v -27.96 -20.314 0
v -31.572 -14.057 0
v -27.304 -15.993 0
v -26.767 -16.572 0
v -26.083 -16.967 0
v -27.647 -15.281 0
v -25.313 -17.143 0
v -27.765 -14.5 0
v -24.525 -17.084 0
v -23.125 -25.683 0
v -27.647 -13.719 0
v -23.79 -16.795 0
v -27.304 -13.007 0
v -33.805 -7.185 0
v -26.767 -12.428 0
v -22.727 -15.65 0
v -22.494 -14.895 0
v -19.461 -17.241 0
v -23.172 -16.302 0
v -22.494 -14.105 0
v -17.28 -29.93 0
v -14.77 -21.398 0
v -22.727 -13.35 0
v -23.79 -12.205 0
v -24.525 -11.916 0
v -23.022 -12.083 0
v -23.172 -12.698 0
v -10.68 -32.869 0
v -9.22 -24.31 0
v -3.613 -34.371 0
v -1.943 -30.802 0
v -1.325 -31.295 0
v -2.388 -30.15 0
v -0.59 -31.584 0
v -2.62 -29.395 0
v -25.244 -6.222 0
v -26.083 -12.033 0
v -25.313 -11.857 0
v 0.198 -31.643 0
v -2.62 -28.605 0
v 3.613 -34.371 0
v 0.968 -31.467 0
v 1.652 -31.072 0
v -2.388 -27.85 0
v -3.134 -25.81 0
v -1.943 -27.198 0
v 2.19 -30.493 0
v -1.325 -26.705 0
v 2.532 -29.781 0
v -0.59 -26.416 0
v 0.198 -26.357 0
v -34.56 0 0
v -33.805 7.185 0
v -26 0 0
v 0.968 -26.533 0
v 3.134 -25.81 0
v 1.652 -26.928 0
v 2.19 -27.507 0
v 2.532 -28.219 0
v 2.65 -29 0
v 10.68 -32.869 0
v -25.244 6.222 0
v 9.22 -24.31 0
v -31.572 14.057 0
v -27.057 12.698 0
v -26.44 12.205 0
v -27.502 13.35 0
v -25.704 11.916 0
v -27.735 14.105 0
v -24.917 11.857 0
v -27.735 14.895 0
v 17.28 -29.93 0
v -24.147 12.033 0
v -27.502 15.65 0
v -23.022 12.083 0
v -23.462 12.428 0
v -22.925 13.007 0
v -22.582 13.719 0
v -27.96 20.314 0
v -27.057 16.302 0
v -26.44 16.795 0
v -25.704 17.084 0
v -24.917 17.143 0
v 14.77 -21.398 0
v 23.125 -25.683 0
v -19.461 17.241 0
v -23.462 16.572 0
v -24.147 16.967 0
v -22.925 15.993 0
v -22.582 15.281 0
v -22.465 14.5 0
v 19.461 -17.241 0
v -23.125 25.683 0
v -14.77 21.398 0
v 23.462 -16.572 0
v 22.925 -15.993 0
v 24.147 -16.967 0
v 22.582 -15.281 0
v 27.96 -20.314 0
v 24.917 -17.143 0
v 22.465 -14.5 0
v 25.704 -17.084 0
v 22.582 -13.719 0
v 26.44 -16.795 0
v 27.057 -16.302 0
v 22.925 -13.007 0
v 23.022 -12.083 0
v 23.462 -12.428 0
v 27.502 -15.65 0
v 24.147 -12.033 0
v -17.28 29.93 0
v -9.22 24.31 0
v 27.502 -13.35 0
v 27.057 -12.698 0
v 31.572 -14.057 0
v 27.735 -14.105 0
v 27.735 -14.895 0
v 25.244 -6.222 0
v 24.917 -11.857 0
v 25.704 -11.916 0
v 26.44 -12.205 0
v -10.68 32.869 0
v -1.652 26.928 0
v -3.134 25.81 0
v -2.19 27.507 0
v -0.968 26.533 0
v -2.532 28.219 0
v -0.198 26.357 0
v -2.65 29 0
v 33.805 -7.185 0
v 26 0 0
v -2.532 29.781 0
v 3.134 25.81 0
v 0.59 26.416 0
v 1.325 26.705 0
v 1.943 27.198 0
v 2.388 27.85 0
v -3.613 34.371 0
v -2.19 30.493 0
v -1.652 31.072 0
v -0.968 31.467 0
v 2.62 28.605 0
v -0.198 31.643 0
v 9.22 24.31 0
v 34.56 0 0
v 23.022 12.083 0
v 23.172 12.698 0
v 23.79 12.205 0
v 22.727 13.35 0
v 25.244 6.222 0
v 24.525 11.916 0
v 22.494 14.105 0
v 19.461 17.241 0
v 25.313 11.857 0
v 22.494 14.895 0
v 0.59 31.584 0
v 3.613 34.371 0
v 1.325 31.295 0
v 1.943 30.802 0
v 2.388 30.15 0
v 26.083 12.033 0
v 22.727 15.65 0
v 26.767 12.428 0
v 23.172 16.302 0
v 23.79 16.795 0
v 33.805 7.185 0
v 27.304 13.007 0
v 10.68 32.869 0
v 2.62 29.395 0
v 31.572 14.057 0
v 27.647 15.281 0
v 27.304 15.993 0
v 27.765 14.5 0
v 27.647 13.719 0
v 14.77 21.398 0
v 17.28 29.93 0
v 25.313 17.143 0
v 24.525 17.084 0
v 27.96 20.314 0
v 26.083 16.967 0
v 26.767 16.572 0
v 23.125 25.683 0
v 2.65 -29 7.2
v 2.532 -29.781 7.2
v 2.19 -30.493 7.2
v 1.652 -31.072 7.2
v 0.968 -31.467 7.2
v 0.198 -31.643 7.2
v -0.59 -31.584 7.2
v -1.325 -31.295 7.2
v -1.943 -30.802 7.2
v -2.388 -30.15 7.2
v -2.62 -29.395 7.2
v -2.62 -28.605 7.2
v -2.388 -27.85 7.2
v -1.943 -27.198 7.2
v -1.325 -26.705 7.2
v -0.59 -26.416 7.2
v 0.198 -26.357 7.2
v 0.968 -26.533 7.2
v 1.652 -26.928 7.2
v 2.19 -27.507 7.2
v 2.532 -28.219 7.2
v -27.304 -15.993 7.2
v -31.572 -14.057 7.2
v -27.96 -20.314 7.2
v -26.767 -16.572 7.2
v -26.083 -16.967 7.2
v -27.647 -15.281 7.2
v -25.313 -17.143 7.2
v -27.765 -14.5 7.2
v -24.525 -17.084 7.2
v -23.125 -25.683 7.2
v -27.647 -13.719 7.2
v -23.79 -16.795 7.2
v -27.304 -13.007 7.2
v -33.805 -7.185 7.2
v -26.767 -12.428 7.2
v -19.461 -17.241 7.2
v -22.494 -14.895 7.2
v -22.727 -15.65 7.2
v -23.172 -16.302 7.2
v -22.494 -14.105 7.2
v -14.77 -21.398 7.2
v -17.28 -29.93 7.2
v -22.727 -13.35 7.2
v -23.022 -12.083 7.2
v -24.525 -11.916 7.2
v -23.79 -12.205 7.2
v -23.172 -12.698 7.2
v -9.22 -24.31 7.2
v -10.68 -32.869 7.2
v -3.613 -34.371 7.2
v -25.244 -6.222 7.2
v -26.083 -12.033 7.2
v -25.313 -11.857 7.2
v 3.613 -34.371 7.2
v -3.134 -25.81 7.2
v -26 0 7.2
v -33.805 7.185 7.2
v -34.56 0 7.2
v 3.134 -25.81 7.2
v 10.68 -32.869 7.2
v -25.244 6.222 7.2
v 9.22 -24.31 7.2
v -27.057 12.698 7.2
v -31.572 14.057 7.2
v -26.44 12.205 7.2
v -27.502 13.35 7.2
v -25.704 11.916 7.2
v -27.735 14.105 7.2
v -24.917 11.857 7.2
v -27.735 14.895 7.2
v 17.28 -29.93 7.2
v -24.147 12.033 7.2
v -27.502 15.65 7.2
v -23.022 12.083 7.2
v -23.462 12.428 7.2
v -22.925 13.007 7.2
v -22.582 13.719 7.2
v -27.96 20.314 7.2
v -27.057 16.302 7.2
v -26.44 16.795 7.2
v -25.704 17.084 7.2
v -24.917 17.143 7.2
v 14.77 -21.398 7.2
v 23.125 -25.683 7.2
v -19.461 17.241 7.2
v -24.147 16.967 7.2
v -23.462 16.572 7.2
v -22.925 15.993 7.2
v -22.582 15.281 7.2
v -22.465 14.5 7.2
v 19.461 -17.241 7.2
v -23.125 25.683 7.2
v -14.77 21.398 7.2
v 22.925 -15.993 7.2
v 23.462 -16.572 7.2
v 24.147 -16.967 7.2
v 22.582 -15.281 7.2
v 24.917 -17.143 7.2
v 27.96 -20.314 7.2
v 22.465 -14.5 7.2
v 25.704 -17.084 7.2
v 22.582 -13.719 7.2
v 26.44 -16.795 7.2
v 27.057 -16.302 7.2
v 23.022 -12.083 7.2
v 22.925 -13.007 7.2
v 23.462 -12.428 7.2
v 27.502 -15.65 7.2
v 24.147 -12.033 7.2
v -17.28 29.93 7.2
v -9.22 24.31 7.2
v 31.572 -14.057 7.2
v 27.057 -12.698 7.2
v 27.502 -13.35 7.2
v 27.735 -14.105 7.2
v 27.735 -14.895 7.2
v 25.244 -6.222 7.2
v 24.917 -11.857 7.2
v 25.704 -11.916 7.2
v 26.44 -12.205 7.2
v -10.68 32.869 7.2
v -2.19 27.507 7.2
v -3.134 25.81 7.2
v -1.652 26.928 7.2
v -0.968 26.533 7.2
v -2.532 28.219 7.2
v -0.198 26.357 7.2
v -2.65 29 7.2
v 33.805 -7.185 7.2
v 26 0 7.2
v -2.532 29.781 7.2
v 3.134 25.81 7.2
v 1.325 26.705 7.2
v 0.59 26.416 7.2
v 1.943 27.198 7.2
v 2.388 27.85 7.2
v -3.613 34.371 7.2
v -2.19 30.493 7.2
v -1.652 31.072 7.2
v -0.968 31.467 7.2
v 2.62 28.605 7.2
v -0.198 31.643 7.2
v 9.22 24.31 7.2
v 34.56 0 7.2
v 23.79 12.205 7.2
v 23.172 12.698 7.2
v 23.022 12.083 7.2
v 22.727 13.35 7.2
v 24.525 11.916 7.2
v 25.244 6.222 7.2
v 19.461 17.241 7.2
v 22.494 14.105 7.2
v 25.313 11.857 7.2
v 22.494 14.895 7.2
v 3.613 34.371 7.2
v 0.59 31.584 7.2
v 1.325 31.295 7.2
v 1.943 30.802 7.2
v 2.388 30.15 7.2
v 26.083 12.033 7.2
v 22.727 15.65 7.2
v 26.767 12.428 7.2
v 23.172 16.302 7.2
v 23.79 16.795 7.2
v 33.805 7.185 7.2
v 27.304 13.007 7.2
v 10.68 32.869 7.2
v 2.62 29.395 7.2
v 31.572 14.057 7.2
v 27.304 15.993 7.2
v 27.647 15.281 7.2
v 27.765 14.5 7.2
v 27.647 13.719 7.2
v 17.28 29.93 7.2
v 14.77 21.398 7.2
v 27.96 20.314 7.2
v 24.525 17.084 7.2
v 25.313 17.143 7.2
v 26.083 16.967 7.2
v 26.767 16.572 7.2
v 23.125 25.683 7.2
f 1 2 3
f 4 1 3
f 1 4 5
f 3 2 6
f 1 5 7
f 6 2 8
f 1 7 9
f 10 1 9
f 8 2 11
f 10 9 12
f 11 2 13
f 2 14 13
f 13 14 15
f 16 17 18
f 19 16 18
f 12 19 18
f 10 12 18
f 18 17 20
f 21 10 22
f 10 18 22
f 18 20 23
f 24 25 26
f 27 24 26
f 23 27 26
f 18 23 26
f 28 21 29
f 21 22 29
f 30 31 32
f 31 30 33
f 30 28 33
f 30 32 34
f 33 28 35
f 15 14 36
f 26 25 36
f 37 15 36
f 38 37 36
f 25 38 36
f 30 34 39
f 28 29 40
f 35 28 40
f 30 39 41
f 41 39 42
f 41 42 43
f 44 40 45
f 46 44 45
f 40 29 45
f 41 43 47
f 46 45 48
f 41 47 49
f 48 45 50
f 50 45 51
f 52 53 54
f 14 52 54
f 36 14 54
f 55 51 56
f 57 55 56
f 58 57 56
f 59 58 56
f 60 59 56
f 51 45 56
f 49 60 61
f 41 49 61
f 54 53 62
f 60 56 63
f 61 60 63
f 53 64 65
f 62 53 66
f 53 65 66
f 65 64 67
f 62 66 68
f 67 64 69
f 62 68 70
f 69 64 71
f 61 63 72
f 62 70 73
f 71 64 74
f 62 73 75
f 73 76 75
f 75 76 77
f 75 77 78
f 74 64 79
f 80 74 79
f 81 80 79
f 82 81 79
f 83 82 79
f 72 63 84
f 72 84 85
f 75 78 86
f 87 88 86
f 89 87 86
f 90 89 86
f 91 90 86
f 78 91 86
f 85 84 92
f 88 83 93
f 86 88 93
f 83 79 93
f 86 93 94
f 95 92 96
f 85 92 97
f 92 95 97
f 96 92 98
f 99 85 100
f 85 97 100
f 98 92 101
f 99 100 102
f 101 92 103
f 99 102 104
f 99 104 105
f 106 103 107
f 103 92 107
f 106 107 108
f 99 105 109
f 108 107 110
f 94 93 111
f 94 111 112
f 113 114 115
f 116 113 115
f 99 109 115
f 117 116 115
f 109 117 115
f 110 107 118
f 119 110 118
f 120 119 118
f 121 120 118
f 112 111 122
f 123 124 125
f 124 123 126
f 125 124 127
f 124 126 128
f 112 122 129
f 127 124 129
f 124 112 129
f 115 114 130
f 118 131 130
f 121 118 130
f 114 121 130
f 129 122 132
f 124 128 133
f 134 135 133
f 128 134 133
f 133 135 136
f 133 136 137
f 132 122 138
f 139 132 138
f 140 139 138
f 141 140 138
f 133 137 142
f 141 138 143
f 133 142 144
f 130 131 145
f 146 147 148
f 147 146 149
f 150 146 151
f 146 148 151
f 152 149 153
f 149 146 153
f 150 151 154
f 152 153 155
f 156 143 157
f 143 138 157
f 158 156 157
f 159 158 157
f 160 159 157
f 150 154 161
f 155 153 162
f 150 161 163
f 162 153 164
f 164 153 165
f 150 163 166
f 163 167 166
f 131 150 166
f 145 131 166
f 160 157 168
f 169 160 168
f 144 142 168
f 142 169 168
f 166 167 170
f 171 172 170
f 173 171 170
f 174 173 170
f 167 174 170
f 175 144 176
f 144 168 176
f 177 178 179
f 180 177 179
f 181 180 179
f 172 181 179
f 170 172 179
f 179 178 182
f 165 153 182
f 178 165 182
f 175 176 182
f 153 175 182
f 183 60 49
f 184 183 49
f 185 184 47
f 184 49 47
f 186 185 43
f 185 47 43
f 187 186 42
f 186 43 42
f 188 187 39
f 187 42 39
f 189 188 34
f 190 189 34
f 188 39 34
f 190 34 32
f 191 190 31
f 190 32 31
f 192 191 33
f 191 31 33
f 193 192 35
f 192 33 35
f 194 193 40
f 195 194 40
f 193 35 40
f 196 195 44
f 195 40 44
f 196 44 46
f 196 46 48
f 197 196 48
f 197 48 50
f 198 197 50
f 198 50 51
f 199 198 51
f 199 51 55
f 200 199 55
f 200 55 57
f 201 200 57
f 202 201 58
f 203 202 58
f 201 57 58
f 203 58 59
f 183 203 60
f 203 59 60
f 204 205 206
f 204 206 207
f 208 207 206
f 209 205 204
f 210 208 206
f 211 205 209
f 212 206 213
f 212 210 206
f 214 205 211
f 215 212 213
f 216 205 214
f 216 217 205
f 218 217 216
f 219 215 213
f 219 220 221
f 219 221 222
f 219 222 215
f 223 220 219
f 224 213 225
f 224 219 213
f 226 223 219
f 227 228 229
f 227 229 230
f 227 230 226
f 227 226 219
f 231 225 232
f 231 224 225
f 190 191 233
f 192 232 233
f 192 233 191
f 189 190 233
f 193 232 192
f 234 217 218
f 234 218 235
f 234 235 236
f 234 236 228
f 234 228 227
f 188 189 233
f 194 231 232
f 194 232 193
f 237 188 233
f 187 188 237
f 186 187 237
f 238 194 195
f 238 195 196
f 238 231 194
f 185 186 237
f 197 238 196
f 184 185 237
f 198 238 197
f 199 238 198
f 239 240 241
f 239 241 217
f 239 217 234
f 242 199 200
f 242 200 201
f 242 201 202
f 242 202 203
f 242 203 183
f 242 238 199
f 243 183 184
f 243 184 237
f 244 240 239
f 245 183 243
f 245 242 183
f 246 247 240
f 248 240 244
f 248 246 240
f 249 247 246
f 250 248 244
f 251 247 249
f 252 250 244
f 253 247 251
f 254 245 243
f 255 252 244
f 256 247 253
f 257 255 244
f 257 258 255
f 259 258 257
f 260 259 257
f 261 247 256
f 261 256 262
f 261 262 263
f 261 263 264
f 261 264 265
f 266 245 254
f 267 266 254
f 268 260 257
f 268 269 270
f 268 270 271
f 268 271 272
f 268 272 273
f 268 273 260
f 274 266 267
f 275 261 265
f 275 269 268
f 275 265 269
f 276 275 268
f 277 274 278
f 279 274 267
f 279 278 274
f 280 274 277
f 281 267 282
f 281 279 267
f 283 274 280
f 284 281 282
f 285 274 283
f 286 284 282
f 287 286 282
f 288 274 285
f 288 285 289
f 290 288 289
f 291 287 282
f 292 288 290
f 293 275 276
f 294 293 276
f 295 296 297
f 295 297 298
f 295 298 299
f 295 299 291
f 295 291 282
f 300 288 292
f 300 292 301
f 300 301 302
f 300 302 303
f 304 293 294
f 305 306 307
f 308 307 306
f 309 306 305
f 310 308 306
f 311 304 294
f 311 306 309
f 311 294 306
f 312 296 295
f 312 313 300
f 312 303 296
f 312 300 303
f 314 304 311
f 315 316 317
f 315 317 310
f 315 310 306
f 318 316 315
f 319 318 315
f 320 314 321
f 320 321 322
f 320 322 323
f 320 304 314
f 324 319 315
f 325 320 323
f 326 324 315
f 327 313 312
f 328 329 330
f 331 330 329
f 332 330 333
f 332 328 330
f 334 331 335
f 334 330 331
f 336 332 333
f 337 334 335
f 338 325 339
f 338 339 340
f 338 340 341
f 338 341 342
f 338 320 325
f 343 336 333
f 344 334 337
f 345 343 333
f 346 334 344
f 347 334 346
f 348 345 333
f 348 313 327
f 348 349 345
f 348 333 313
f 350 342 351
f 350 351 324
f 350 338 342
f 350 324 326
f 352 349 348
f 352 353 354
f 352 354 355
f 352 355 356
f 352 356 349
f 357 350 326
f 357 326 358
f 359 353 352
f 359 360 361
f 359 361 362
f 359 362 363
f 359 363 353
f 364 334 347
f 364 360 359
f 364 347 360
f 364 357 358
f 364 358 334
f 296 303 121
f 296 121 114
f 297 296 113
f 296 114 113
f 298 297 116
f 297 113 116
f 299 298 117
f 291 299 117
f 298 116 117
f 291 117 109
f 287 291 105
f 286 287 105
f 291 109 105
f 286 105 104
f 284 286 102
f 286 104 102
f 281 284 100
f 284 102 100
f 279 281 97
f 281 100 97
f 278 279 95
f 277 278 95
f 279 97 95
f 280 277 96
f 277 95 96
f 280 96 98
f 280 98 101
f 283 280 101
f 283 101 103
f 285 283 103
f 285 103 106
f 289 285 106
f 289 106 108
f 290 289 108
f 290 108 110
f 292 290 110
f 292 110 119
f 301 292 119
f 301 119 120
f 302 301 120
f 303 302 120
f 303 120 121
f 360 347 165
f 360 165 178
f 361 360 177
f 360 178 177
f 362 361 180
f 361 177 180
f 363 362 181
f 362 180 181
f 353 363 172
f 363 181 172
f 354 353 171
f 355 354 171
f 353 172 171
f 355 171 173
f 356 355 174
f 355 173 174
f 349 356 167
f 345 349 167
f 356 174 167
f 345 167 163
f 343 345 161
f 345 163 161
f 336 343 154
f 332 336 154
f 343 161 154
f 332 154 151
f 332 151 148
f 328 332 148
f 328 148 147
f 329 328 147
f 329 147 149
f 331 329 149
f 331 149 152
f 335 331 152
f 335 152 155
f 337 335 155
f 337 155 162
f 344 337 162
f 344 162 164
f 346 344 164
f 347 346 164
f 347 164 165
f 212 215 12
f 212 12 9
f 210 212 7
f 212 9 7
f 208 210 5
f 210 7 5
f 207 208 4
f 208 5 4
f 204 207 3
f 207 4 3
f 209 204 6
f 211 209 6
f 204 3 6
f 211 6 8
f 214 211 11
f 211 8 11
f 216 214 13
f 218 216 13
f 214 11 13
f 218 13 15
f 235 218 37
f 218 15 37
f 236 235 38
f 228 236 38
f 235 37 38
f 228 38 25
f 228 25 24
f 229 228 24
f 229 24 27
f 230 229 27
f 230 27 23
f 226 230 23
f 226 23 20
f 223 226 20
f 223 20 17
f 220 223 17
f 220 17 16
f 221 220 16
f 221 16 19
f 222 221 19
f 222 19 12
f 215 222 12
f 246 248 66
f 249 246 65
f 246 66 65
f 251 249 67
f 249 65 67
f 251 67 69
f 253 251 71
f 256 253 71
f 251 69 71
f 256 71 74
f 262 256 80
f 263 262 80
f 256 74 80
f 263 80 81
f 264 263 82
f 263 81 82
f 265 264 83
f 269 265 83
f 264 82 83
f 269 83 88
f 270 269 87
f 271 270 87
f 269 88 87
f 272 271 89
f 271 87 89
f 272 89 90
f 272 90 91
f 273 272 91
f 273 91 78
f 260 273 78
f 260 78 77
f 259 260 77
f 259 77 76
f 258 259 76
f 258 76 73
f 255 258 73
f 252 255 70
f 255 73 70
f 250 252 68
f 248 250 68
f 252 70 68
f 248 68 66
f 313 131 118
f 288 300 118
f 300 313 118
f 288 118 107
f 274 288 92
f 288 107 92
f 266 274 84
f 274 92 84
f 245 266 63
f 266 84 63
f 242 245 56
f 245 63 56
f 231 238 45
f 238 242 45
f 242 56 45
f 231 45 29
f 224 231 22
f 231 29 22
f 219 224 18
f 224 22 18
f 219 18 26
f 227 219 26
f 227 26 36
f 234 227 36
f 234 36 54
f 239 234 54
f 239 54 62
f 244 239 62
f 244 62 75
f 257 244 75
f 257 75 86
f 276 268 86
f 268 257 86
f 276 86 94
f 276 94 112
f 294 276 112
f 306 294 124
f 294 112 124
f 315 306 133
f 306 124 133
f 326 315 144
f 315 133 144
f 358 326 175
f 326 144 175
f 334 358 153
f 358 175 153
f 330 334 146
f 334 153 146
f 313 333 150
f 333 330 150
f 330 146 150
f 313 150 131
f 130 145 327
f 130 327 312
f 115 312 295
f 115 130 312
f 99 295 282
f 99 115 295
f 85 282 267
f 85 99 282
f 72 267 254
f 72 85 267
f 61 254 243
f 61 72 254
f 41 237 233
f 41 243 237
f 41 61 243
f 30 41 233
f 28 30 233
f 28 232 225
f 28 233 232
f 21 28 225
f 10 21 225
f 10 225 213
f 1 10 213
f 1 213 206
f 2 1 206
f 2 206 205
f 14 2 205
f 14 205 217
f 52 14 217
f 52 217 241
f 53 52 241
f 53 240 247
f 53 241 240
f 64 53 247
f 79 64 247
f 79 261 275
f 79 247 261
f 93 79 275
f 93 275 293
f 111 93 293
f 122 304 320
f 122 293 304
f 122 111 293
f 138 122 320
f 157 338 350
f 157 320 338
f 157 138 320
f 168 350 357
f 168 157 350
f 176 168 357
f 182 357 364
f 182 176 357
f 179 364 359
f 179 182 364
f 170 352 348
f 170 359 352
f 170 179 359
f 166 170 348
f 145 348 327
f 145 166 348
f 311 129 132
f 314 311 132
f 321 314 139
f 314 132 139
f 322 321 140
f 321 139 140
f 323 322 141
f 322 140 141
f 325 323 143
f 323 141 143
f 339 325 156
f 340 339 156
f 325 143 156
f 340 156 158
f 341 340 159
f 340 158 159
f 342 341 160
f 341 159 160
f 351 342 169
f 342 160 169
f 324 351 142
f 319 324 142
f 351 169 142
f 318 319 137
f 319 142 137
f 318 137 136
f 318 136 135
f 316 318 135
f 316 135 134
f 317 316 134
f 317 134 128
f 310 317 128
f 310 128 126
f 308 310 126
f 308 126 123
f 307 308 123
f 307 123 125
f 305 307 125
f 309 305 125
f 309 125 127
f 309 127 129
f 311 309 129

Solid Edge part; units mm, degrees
sketch "Sketch1" plane through (0, 0, 0) normal (0, 0, 1) x (1, 0, 0)
  circle A0 centre (0, 0) radius 34.56
  circle A1 centre (0, 0) radius 26
extrude "Protrusion1" add sketch "Sketch1" along normal blind 7.2
sketch "Sketch2" plane through (0, 0, 0) normal (0, 0, -1) x (-1, 0, 0)
  circle A0 centre (0, 29) radius 2.65
  dimension "D1" = 5.3
  dimension "D2" = 29
extrude "Hål_för_skruv" cut sketch "Sketch2" along normal mid plane 493.3012
pattern_circular "Pattern1" count 6 over 360 about axis through (0, 0, 0) along (0, 0, 1) of "Hål_för_skruv"
properties material "Steel"
